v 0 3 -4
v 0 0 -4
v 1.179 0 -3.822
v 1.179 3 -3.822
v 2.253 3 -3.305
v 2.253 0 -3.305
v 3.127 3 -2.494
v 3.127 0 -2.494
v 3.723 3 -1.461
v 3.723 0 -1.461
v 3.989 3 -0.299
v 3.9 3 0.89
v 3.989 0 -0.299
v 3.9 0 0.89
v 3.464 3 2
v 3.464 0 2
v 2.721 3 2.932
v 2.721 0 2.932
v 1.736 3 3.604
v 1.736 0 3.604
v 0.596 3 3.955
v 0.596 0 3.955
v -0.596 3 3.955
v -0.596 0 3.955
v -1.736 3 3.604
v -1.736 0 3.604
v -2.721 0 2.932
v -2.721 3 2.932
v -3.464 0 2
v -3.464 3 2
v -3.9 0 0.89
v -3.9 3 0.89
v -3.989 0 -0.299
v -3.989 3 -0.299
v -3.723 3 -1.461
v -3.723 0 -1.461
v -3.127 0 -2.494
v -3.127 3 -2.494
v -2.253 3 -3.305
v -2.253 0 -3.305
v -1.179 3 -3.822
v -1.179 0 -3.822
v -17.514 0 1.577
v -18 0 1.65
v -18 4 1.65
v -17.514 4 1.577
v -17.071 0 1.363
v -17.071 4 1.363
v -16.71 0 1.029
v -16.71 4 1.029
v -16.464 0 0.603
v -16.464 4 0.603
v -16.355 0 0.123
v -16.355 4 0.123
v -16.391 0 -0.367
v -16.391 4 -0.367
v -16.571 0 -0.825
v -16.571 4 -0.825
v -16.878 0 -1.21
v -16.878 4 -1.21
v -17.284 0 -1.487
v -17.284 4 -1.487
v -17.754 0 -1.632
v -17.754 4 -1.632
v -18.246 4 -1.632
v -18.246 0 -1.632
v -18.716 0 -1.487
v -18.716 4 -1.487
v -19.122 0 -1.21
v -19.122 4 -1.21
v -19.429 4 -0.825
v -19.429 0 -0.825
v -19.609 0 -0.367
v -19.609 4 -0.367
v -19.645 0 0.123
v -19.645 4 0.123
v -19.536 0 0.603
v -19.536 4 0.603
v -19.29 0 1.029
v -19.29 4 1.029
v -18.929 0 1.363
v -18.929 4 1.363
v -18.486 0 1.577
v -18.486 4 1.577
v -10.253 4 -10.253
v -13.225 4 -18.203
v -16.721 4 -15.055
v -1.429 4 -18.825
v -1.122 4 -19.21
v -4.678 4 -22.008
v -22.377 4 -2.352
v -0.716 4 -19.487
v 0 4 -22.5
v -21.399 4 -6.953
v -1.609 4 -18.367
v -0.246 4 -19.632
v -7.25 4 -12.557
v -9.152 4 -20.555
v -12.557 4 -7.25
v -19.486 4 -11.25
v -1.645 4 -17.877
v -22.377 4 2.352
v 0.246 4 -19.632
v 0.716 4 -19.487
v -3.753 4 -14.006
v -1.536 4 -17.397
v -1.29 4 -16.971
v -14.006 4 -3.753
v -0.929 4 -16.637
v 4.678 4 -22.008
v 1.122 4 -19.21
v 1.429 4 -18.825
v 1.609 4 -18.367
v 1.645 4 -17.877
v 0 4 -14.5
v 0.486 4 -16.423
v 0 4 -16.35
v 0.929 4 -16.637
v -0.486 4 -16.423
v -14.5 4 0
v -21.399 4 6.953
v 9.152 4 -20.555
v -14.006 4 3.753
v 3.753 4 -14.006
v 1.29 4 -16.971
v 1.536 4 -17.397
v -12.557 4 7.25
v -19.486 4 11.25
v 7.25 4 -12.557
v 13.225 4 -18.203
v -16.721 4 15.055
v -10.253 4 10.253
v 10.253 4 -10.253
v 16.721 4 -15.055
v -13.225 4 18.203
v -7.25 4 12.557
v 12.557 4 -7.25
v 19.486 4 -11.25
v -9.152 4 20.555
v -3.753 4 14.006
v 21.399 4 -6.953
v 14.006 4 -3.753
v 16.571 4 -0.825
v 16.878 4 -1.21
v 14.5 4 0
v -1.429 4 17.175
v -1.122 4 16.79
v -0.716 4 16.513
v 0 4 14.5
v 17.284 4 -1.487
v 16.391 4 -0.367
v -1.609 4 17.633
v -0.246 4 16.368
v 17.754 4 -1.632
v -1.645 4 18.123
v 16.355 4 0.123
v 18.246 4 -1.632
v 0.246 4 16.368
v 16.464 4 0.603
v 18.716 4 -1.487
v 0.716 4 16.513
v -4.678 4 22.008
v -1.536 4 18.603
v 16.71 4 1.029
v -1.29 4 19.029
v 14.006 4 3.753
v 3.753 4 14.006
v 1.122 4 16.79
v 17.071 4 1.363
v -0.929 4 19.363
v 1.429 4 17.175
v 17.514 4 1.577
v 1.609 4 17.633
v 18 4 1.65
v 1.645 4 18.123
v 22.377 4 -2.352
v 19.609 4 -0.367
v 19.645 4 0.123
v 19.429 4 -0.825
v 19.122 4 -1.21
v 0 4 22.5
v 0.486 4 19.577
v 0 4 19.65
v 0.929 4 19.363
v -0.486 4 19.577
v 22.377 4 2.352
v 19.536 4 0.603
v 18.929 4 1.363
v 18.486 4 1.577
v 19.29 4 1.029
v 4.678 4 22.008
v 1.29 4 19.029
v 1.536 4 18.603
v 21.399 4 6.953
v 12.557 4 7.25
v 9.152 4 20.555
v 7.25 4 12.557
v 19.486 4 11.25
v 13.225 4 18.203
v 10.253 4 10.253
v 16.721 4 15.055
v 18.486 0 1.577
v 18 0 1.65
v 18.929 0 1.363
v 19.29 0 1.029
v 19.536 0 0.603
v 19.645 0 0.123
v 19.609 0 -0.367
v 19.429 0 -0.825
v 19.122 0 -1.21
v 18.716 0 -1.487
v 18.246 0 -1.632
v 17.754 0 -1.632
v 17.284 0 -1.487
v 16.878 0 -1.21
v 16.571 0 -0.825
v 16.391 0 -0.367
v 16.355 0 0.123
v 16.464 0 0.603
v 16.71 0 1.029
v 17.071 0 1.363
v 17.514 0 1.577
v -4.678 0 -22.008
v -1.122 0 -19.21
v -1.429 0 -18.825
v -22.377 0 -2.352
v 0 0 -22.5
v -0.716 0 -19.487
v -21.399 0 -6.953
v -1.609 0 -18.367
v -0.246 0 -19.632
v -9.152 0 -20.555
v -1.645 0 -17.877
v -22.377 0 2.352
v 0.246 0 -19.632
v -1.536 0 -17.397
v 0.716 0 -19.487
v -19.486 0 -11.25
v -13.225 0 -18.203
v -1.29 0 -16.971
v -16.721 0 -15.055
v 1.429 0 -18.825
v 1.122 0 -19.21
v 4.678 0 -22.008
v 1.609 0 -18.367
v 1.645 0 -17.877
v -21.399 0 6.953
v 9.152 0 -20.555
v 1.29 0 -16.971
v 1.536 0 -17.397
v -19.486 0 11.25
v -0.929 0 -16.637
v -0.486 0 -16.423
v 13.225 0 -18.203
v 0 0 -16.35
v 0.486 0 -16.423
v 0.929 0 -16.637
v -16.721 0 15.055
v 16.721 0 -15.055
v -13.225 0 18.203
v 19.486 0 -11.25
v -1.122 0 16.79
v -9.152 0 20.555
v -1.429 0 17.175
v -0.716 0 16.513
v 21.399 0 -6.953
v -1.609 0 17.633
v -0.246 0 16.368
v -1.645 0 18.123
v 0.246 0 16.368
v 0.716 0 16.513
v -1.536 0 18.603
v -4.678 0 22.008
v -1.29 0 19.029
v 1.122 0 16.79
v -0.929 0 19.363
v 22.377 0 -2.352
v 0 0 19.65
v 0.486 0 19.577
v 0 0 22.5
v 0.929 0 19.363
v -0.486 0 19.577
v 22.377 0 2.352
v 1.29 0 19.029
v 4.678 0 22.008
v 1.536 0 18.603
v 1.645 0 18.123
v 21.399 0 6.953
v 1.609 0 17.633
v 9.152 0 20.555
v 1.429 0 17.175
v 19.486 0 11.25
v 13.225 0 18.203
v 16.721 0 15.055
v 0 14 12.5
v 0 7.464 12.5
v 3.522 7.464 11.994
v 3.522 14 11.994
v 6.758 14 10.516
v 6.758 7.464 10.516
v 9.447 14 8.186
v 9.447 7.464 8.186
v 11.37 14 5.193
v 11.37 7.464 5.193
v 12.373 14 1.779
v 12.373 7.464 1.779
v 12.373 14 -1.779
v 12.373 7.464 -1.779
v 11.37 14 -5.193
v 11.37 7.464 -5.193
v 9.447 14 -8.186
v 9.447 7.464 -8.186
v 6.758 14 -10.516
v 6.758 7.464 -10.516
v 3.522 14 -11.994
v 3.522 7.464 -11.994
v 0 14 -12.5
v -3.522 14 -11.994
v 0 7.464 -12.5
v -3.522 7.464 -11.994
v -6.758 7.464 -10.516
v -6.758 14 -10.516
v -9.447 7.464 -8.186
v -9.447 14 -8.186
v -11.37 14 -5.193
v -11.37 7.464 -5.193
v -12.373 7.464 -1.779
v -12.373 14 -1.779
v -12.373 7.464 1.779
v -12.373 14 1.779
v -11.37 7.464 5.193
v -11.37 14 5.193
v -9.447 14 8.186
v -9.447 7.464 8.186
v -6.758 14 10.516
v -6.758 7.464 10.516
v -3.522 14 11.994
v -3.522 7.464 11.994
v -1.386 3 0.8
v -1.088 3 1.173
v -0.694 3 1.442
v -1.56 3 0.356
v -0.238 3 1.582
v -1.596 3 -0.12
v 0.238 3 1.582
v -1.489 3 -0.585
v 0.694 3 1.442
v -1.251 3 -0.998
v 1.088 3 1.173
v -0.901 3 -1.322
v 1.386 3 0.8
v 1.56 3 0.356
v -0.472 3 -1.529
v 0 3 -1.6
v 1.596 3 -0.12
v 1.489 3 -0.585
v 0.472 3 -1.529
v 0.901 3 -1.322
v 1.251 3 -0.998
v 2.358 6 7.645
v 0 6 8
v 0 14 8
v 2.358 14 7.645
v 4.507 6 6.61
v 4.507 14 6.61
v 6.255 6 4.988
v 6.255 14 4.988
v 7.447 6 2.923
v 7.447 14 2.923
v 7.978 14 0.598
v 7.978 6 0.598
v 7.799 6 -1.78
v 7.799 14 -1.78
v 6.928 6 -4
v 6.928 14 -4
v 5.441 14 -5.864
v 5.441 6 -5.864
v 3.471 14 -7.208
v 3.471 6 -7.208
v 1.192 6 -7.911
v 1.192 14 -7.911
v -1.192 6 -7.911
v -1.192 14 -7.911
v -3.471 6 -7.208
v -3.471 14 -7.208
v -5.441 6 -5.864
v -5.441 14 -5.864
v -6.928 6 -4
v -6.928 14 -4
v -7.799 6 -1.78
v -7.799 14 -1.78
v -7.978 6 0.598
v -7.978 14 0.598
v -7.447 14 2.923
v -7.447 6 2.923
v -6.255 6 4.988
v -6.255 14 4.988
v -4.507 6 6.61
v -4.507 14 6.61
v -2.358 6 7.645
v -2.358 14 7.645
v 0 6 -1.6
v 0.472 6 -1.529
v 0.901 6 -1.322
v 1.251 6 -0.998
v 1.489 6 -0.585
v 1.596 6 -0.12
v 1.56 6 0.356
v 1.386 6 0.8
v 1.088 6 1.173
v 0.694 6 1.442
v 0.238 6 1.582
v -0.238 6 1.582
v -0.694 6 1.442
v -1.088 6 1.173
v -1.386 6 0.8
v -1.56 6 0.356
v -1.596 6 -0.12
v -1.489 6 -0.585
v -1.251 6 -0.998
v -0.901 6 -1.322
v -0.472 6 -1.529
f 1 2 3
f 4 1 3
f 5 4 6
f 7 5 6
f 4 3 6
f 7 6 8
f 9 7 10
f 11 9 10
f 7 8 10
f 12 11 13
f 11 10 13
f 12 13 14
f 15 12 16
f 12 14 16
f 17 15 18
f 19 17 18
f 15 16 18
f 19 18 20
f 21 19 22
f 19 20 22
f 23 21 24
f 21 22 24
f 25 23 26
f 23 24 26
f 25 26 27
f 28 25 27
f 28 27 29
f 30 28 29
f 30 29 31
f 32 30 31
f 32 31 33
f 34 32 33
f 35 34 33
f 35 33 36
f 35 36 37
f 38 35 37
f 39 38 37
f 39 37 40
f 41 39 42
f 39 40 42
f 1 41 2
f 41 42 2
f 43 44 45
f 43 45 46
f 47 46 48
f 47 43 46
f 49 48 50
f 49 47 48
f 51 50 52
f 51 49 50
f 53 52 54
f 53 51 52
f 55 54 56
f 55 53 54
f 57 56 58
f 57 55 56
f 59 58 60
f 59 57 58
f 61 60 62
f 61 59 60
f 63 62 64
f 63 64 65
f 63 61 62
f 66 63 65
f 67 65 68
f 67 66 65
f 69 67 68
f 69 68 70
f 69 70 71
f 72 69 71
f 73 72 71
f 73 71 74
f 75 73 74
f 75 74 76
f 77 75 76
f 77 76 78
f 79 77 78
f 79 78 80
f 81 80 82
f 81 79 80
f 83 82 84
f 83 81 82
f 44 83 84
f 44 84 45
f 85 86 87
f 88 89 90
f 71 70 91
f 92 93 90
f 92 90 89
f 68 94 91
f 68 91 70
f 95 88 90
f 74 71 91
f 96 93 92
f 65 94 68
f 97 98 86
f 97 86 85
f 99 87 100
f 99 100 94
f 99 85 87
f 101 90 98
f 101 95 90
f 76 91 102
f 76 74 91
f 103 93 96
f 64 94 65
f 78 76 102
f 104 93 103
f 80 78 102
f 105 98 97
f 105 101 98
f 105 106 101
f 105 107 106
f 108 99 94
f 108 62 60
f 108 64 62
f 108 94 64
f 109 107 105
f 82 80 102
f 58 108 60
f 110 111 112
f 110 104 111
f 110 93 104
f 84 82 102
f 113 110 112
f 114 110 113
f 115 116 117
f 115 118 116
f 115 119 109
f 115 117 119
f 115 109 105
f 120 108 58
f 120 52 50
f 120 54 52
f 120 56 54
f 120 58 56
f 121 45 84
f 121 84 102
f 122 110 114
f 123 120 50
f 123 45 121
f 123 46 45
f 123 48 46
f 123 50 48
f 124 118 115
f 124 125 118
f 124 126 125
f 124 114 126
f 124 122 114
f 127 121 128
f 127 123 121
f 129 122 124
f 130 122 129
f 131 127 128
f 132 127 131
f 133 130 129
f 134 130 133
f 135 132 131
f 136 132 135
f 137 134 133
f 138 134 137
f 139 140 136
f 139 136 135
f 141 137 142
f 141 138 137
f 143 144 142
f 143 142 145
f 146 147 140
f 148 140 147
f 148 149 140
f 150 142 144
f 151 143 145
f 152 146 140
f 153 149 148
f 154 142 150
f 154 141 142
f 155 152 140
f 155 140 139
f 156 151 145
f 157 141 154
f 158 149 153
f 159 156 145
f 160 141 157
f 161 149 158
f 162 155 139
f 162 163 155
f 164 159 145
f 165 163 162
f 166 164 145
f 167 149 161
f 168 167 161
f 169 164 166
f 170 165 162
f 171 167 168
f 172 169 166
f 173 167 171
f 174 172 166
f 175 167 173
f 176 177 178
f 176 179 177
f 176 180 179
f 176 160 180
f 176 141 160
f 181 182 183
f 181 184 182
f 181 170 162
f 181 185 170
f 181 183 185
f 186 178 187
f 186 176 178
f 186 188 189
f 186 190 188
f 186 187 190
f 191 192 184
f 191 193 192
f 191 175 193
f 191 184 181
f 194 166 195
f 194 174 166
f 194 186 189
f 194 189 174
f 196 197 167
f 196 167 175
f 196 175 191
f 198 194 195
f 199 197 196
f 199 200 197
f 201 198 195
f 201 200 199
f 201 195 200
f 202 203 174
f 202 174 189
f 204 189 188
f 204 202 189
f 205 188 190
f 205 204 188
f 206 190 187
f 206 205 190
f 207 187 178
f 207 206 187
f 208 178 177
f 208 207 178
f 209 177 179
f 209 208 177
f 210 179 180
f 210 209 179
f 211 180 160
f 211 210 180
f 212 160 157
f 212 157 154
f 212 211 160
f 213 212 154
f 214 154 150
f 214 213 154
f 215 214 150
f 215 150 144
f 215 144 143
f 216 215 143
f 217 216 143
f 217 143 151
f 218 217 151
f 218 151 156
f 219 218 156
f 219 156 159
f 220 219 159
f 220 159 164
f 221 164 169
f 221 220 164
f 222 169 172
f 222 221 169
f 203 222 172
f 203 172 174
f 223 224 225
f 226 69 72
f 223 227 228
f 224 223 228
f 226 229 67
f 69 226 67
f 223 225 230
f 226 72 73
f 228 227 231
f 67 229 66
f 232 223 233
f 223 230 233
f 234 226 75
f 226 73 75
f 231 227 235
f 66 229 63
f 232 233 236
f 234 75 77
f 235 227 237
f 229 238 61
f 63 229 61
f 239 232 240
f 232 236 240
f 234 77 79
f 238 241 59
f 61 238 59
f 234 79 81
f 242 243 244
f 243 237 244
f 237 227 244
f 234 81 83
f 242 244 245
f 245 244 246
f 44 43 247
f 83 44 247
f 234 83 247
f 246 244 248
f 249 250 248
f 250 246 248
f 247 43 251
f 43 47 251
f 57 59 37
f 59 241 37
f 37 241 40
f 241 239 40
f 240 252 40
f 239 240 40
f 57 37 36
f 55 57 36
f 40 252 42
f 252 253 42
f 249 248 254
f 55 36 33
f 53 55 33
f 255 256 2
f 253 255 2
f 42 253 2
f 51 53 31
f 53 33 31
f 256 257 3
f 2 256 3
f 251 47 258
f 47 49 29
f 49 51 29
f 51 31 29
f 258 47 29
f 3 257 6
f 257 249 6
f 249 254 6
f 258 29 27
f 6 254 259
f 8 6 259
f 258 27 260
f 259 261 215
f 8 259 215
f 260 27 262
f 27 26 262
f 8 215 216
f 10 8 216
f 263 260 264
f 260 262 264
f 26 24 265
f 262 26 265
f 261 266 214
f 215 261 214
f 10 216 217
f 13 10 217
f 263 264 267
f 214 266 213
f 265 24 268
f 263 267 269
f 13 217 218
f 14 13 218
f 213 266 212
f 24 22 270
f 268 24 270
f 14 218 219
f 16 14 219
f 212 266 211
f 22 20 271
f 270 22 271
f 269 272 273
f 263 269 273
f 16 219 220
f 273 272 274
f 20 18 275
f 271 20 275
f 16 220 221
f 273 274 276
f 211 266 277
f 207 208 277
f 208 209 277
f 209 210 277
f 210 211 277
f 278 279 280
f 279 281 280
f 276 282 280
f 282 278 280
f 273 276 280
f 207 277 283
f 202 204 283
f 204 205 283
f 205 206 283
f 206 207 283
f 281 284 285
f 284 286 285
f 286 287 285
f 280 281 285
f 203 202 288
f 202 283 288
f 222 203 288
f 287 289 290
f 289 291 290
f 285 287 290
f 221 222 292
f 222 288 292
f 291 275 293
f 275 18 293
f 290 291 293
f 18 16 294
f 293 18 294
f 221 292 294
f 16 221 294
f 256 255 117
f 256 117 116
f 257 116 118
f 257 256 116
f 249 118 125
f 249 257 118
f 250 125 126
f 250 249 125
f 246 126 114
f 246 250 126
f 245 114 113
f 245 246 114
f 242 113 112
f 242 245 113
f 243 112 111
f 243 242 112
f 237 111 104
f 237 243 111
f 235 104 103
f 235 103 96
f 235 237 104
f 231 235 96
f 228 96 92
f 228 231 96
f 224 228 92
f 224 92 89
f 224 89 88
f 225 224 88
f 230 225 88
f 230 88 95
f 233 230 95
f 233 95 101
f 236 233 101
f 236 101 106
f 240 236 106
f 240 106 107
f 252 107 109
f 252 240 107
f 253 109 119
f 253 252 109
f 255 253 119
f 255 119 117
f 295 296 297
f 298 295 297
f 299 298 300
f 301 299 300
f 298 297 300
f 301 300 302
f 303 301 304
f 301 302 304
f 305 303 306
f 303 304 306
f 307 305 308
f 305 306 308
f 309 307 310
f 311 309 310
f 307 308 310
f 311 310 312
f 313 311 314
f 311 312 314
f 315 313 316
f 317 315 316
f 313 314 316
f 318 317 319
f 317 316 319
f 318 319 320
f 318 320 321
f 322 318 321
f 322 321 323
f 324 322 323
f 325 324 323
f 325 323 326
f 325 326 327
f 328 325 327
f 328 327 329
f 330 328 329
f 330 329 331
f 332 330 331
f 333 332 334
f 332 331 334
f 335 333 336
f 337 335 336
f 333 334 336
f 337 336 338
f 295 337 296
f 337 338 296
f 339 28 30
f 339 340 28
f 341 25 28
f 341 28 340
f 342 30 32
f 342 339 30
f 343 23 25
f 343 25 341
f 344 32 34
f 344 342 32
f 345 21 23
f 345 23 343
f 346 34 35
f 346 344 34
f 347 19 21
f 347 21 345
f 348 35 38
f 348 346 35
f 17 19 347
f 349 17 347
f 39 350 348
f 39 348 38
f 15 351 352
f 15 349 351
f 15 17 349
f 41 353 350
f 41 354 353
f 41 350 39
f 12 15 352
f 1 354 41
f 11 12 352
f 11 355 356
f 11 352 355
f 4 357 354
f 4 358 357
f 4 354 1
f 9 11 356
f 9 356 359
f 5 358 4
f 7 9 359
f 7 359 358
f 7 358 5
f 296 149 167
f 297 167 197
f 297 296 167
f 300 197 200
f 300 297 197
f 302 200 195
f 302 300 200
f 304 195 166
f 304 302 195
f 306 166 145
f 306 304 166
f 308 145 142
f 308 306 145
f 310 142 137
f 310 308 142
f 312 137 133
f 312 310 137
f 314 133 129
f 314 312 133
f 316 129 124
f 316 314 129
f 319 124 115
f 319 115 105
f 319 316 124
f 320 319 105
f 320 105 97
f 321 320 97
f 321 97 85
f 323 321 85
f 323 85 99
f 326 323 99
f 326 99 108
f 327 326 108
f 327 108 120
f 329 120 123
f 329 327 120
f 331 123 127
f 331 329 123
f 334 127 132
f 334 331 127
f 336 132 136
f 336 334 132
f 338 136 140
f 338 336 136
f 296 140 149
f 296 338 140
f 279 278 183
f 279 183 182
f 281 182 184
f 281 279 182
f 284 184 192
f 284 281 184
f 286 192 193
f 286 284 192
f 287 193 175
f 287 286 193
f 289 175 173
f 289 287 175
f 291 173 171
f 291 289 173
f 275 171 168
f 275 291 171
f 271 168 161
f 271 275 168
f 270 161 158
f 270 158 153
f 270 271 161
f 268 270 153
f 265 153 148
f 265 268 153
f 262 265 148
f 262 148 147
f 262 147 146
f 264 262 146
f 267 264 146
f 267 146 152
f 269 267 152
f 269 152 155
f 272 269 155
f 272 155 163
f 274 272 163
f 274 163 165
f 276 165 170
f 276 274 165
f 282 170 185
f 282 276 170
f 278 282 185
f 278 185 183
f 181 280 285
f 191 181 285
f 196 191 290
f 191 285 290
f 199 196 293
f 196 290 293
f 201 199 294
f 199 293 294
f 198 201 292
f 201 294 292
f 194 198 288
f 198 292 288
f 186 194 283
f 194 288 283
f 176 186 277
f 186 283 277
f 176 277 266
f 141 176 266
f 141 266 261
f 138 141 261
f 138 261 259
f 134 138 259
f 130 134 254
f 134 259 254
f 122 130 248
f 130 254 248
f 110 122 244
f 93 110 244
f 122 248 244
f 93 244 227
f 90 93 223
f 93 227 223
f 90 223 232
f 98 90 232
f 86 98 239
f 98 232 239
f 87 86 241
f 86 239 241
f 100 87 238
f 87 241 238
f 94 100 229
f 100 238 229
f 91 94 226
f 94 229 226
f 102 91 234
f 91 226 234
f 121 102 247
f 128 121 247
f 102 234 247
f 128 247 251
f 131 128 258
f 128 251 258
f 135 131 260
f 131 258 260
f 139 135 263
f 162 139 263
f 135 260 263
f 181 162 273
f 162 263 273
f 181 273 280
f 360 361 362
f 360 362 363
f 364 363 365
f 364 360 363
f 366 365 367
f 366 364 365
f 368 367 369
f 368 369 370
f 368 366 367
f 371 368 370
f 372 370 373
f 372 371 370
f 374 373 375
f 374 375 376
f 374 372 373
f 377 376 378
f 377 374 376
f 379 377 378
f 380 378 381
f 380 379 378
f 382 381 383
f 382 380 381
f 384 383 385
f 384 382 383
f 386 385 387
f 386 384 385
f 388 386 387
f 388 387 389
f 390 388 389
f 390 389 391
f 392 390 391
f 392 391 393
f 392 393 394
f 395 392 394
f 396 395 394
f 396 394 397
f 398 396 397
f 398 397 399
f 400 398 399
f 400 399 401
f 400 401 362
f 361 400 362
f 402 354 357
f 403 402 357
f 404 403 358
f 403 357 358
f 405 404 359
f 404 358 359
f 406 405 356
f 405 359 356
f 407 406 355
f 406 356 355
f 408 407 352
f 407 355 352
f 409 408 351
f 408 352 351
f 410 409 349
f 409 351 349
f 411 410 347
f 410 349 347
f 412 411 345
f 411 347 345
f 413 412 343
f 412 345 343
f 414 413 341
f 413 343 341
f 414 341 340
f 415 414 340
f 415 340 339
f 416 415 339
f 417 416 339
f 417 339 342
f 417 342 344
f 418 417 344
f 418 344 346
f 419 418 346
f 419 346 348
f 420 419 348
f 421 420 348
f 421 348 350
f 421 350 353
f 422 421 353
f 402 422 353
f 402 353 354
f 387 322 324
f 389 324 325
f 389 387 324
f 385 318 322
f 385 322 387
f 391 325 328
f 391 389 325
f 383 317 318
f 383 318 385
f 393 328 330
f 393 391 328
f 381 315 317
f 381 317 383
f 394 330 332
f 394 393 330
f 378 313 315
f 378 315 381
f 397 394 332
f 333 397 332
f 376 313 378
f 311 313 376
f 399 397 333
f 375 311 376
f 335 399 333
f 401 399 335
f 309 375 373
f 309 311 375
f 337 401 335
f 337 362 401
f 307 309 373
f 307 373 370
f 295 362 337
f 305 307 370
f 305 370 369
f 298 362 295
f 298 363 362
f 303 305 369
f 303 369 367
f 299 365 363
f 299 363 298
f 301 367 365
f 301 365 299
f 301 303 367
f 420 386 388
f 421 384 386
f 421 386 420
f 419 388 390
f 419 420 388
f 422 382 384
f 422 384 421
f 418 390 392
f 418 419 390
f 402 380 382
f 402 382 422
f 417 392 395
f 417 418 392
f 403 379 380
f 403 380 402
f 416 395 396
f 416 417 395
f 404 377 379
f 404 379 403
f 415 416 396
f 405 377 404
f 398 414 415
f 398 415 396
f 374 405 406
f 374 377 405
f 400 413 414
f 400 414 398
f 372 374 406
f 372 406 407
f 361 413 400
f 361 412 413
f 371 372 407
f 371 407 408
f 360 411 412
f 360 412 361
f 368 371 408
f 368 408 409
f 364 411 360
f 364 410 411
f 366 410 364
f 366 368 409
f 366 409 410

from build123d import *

# Parameters (mm, degrees)
SKETCH_1_R          = 22.5
SKETCH_1_R_2        = 1.65
EXTRUDE_1_DEPTH     = 4
SKETCH_2_R          = 12.5
SKETCH_2_R_2        = 8
EXTRUDE_2_DEPTH     = 10
SKETCH_3_R          = 4
CUT_EXTRUDE_1_DEPTH = 3
SKETCH_4_R          = 8
EXTRUDE_3_DEPTH     = 2
SKETCH_3_3_R        = 1.6
CUT_EXTRUDE_2_DEPTH = 10
CHAMFER_1_SIZE      = 2
CHAMFER_1_SIZE2     = 3.464101615


with BuildPart() as part:
    # 草图1 → 凸台-拉伸1 (new body)
    with BuildSketch(Plane(origin=(0, 0, 0), x_dir=(1, 0, 0), z_dir=(0, 1, 0))):
        Circle(SKETCH_1_R)
        with Locations((-18, 0)):
            Circle(SKETCH_1_R_2, mode=Mode.SUBTRACT)
        with Locations((18, 0)):
            Circle(SKETCH_1_R_2, mode=Mode.SUBTRACT)
        with Locations((0, 18)):
            Circle(SKETCH_1_R_2, mode=Mode.SUBTRACT)
        with Locations((0, -18)):
            Circle(SKETCH_1_R_2, mode=Mode.SUBTRACT)
    extrude(amount=EXTRUDE_1_DEPTH)

    # 草图2 → 凸台-拉伸2 (add)
    with BuildSketch(Plane(origin=(0, 4, 0), x_dir=(1, 0, 0), z_dir=(0, 1, 0))):
        Circle(SKETCH_2_R)
        Circle(SKETCH_2_R_2, mode=Mode.SUBTRACT)
    extrude(amount=EXTRUDE_2_DEPTH)

    # 草图3 → 切除-拉伸1 (cut)
    with BuildSketch(Plane.XZ):
        Circle(SKETCH_3_R)
    extrude(amount=-CUT_EXTRUDE_1_DEPTH, mode=Mode.SUBTRACT)

    # 草图4 → 凸台-拉伸3 (add)
    with BuildSketch(Plane(origin=(0, 4, 0), x_dir=(1, 0, 0), z_dir=(0, 1, 0))):
        Circle(SKETCH_4_R)
    extrude(amount=EXTRUDE_3_DEPTH)

    # 草图3<3> → 切除-拉伸2 (cut)
    with BuildSketch(Plane.XZ):
        Circle(SKETCH_3_3_R)
    extrude(amount=-CUT_EXTRUDE_2_DEPTH, mode=Mode.SUBTRACT)

    # 倒角1
    chamfer_1_edges = [part.edges().sort_by_distance(p)[0] for p in [
        (-12.5, 4, 0),
    ]]
    chamfer_1_side = [part.faces().sort_by_distance(p)[0] for p in [
        (-21.863603897, 4, 0),
    ]]
    chamfer(chamfer_1_edges, length=CHAMFER_1_SIZE, length2=CHAMFER_1_SIZE2, reference=chamfer_1_side[0])


solid = part.part
